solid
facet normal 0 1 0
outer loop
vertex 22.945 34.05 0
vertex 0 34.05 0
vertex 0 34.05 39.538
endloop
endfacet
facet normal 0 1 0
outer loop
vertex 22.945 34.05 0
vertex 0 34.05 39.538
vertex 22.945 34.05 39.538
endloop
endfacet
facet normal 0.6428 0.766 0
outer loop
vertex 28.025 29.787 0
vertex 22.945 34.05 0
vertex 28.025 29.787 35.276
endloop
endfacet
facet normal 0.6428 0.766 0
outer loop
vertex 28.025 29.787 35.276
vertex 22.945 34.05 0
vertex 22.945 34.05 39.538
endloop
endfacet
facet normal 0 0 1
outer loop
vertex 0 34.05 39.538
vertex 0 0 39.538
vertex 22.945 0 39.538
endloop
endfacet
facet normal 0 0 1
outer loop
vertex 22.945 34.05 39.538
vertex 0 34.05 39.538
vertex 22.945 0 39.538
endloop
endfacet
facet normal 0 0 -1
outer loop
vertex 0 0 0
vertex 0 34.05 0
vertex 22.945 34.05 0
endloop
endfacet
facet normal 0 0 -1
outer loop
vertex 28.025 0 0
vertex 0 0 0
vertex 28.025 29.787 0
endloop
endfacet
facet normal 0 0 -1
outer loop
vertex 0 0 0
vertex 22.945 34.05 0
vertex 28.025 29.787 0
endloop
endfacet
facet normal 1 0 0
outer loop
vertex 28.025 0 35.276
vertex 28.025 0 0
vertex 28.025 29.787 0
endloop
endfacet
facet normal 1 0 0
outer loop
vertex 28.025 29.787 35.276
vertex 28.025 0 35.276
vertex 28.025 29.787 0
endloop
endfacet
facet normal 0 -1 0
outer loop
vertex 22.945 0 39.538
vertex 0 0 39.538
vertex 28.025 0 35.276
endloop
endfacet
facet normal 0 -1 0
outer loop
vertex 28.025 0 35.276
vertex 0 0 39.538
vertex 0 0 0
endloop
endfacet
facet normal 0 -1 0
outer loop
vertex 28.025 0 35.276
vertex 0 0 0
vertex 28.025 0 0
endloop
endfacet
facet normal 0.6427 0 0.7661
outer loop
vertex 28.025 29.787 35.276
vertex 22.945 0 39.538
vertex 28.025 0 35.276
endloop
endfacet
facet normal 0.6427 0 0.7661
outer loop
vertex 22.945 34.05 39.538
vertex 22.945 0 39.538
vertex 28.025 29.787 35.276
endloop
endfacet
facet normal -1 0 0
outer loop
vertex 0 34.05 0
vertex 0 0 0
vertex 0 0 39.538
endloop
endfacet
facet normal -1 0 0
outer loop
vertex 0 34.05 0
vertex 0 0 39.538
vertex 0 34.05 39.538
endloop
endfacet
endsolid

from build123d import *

# Parameters (mm, degrees)
F0_W     = 28.0245169997
F0_H     = 34.0497903526
F1_DEPTH = 39.53846
F2_SIZE2 = 5.08
F2_SIZE  = 4.2626261264


with BuildPart() as f1:
    # F0 (on Top) → F1 (new body)
    with BuildSketch(Plane.XY):
        with Locations((14.0122584999, 17.0248951763)):
            Rectangle(F0_W, F0_H)
    extrude(amount=F1_DEPTH)

    # F2
    f2_edges = [f1.edges().sort_by_distance(p)[0] for p in [
        (28.024517, 34.04979, 19.76923),
        (28.024517, 17.024895, 39.53846),
    ]]
    f2_side = f1.faces().sort_by_distance((28.024517, 17.024895, 19.76923))[0]
    chamfer(f2_edges, length=F2_SIZE, length2=F2_SIZE2, reference=f2_side)


solid = f1.part
